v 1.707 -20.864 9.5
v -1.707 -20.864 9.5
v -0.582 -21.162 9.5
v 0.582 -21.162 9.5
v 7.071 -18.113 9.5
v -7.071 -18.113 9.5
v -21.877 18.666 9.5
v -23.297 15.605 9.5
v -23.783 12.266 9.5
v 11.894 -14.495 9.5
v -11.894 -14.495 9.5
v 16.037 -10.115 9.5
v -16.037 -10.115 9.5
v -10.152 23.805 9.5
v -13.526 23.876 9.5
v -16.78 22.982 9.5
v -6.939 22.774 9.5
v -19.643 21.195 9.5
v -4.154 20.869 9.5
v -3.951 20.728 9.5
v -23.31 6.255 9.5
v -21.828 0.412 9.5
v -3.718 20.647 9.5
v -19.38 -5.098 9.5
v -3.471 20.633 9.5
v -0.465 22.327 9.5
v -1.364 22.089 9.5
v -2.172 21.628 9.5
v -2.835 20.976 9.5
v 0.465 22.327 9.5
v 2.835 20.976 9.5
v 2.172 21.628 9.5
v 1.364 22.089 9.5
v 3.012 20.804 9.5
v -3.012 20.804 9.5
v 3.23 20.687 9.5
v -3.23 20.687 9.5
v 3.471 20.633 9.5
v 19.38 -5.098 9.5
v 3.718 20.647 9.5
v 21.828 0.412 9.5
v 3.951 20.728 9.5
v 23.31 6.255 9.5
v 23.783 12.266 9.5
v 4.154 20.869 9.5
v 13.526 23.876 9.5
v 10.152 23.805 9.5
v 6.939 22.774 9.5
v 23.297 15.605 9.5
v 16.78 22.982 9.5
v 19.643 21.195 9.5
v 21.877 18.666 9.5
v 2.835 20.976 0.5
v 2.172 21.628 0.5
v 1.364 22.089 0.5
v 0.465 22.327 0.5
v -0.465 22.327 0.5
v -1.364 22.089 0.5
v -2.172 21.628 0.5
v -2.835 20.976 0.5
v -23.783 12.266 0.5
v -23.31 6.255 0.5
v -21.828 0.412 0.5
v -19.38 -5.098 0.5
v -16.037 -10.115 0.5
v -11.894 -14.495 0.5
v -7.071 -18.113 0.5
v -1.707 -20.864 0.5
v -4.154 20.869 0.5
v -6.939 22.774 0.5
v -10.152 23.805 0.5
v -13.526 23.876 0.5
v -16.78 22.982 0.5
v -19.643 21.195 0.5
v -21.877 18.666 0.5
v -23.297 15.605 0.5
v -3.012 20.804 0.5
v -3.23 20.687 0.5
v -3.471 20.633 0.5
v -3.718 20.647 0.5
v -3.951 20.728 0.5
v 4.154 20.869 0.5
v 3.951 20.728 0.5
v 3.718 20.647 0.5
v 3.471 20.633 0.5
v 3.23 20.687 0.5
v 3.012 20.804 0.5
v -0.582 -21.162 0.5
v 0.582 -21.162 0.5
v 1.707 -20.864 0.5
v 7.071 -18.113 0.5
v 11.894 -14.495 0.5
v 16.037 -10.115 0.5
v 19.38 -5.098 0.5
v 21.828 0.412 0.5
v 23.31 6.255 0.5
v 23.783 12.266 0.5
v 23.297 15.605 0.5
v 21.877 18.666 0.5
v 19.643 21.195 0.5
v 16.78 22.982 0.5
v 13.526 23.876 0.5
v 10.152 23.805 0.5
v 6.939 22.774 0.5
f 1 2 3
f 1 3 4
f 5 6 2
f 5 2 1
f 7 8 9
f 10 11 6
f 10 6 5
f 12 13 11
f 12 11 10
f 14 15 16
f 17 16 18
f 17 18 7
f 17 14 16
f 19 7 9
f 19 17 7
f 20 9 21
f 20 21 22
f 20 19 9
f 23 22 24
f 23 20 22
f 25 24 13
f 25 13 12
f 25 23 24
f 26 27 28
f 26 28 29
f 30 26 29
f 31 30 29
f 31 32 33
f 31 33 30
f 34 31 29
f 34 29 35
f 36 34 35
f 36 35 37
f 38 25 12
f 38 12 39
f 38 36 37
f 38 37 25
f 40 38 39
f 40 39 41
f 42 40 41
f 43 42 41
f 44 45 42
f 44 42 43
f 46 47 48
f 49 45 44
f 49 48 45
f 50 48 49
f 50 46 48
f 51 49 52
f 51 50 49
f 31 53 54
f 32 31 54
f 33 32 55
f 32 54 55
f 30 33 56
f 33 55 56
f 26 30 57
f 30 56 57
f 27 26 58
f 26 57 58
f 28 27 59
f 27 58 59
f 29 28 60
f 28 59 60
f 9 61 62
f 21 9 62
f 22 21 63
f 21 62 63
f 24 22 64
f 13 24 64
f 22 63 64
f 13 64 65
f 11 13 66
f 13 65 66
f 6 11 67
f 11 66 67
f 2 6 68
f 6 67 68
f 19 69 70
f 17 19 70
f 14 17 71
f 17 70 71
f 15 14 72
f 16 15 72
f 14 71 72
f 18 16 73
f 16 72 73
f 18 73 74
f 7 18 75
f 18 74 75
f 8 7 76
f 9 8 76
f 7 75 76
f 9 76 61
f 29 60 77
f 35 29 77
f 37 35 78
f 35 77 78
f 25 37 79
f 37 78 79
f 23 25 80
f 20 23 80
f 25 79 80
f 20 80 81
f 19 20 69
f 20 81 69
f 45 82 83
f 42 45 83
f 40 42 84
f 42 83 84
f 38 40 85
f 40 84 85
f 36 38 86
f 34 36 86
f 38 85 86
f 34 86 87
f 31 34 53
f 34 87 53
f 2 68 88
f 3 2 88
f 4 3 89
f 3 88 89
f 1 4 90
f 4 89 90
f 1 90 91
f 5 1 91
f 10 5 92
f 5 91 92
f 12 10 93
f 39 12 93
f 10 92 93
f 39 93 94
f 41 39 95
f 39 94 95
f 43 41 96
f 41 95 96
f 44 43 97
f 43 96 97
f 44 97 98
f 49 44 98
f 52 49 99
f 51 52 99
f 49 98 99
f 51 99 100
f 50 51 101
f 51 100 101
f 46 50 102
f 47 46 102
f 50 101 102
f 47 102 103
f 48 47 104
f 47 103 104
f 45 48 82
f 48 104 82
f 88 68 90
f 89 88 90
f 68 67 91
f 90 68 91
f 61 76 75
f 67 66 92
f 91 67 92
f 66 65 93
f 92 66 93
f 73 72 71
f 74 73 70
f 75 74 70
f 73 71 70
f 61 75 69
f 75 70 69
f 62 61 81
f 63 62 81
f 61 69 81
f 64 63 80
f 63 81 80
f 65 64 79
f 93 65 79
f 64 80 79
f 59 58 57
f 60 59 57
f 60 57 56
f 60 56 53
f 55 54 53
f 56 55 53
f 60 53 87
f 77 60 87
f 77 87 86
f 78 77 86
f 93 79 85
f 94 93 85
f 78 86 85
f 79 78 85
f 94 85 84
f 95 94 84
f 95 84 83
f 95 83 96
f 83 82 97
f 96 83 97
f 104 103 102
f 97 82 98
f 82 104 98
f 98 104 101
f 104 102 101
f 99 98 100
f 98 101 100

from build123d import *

# Parameters (mm, degrees)
DODANIE_WYCI_GNI_CIE1_DEPTH = 10
SKALA1_SCALE                = 0.9


with BuildPart() as part:
    # Szkic1 → Dodanie-wyciągnięcie1 (new body)
    with BuildSketch(Plane.XY):
        with BuildLine():
            ThreePointArc((-4.61531313, 22.743178996), (-18.644238864, 25.090860352), (-26.425868288, 13.184197993))
            ThreePointArc((-26.425868288, 13.184197993), (-19.794080105, -8.974802604), (-1.896314698, -23.62648904))
            ThreePointArc((-1.896314698, -23.62648904), (0, -24.000044339), (1.896314698, -23.62648904))
            ThreePointArc((1.896314698, -23.62648904), (19.794080105, -8.974802604), (26.425868288, 13.184197993))
            ThreePointArc((26.425868288, 13.184197993), (18.644238864, 25.090860352), (4.61531313, 22.743178996))
            ThreePointArc((4.61531313, 22.743178996), (3.856622065, 22.481767555), (3.150062494, 22.862190539))
            ThreePointArc((3.150062494, 22.862190539), (0, 24.397011786), (-3.150062494, 22.862190539))
            ThreePointArc((-3.150062494, 22.862190539), (-3.856622065, 22.481767555), (-4.61531313, 22.743178996))
        make_face()
    extrude(amount=DODANIE_WYCI_GNI_CIE1_DEPTH)


with BuildPart() as part_1:
    # Skala1: scaled about (0, 3.998335482, 5)
    add(part.part.scale(SKALA1_SCALE).moved(Location((0, 0.399833548, 0.5))))


solid = part_1.part
